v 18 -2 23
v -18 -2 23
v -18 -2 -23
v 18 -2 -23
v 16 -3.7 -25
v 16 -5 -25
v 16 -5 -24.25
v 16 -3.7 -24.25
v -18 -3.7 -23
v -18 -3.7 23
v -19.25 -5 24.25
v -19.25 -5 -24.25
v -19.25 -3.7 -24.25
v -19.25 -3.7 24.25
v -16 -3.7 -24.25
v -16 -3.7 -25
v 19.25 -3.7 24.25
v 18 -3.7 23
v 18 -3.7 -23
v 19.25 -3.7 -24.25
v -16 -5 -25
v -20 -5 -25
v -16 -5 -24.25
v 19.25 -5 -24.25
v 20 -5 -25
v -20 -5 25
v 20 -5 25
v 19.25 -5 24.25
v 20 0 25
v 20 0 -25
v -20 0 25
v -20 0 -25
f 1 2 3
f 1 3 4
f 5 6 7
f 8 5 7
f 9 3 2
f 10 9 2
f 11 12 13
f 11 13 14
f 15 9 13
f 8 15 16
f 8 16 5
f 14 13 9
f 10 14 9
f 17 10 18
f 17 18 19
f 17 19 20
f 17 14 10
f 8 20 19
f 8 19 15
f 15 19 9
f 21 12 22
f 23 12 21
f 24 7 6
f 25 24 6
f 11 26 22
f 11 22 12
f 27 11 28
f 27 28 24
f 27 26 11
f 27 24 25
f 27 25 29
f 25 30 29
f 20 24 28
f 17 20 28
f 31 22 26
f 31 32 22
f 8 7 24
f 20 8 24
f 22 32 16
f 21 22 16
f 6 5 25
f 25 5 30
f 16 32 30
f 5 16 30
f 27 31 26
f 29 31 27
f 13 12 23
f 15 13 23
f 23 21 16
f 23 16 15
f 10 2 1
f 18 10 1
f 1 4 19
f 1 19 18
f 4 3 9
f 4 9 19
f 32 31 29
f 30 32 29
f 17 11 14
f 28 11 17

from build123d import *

# Parameters (mm, degrees)
F0_W     = 40
F0_H     = 50
F1_DEPTH = 2
F2_W     = 40
F2_H     = 50
F2_W_2   = 36
F2_H_2   = 46
F3_DEPTH = 3
F4_W     = 38.5
F4_H     = 48.5
F4_W_2   = 36
F4_H_2   = 46
F5_DEPTH = 1.3
F6_W     = 32
F6_H     = 0.75
F7_DEPTH = 1.3


with BuildPart() as f1:
    # F0 (on Front) → F1 (new body)
    with BuildSketch(Plane.XZ):
        Rectangle(F0_W, F0_H)
    extrude(amount=F1_DEPTH)

    # F2 (on face) → F3 (join)
    with BuildSketch(Plane.XZ.offset(2)):
        Rectangle(F2_W, F2_H)
        Rectangle(F2_W_2, F2_H_2, mode=Mode.SUBTRACT)
    extrude(amount=F3_DEPTH)

    # F4 (on face) → F5 (cut)
    with BuildSketch(Plane.XZ.offset(5)):
        Rectangle(F4_W, F4_H)
        Rectangle(F4_W_2, F4_H_2, mode=Mode.SUBTRACT)
    extrude(amount=-F5_DEPTH, mode=Mode.SUBTRACT)

    # F6 (on face) → F7 (cut)
    with BuildSketch(Plane.XZ.offset(5)):
        with Locations((0, -24.625)):
            Rectangle(F6_W, F6_H)
    extrude(amount=-F7_DEPTH, mode=Mode.SUBTRACT)


solid = f1.part
